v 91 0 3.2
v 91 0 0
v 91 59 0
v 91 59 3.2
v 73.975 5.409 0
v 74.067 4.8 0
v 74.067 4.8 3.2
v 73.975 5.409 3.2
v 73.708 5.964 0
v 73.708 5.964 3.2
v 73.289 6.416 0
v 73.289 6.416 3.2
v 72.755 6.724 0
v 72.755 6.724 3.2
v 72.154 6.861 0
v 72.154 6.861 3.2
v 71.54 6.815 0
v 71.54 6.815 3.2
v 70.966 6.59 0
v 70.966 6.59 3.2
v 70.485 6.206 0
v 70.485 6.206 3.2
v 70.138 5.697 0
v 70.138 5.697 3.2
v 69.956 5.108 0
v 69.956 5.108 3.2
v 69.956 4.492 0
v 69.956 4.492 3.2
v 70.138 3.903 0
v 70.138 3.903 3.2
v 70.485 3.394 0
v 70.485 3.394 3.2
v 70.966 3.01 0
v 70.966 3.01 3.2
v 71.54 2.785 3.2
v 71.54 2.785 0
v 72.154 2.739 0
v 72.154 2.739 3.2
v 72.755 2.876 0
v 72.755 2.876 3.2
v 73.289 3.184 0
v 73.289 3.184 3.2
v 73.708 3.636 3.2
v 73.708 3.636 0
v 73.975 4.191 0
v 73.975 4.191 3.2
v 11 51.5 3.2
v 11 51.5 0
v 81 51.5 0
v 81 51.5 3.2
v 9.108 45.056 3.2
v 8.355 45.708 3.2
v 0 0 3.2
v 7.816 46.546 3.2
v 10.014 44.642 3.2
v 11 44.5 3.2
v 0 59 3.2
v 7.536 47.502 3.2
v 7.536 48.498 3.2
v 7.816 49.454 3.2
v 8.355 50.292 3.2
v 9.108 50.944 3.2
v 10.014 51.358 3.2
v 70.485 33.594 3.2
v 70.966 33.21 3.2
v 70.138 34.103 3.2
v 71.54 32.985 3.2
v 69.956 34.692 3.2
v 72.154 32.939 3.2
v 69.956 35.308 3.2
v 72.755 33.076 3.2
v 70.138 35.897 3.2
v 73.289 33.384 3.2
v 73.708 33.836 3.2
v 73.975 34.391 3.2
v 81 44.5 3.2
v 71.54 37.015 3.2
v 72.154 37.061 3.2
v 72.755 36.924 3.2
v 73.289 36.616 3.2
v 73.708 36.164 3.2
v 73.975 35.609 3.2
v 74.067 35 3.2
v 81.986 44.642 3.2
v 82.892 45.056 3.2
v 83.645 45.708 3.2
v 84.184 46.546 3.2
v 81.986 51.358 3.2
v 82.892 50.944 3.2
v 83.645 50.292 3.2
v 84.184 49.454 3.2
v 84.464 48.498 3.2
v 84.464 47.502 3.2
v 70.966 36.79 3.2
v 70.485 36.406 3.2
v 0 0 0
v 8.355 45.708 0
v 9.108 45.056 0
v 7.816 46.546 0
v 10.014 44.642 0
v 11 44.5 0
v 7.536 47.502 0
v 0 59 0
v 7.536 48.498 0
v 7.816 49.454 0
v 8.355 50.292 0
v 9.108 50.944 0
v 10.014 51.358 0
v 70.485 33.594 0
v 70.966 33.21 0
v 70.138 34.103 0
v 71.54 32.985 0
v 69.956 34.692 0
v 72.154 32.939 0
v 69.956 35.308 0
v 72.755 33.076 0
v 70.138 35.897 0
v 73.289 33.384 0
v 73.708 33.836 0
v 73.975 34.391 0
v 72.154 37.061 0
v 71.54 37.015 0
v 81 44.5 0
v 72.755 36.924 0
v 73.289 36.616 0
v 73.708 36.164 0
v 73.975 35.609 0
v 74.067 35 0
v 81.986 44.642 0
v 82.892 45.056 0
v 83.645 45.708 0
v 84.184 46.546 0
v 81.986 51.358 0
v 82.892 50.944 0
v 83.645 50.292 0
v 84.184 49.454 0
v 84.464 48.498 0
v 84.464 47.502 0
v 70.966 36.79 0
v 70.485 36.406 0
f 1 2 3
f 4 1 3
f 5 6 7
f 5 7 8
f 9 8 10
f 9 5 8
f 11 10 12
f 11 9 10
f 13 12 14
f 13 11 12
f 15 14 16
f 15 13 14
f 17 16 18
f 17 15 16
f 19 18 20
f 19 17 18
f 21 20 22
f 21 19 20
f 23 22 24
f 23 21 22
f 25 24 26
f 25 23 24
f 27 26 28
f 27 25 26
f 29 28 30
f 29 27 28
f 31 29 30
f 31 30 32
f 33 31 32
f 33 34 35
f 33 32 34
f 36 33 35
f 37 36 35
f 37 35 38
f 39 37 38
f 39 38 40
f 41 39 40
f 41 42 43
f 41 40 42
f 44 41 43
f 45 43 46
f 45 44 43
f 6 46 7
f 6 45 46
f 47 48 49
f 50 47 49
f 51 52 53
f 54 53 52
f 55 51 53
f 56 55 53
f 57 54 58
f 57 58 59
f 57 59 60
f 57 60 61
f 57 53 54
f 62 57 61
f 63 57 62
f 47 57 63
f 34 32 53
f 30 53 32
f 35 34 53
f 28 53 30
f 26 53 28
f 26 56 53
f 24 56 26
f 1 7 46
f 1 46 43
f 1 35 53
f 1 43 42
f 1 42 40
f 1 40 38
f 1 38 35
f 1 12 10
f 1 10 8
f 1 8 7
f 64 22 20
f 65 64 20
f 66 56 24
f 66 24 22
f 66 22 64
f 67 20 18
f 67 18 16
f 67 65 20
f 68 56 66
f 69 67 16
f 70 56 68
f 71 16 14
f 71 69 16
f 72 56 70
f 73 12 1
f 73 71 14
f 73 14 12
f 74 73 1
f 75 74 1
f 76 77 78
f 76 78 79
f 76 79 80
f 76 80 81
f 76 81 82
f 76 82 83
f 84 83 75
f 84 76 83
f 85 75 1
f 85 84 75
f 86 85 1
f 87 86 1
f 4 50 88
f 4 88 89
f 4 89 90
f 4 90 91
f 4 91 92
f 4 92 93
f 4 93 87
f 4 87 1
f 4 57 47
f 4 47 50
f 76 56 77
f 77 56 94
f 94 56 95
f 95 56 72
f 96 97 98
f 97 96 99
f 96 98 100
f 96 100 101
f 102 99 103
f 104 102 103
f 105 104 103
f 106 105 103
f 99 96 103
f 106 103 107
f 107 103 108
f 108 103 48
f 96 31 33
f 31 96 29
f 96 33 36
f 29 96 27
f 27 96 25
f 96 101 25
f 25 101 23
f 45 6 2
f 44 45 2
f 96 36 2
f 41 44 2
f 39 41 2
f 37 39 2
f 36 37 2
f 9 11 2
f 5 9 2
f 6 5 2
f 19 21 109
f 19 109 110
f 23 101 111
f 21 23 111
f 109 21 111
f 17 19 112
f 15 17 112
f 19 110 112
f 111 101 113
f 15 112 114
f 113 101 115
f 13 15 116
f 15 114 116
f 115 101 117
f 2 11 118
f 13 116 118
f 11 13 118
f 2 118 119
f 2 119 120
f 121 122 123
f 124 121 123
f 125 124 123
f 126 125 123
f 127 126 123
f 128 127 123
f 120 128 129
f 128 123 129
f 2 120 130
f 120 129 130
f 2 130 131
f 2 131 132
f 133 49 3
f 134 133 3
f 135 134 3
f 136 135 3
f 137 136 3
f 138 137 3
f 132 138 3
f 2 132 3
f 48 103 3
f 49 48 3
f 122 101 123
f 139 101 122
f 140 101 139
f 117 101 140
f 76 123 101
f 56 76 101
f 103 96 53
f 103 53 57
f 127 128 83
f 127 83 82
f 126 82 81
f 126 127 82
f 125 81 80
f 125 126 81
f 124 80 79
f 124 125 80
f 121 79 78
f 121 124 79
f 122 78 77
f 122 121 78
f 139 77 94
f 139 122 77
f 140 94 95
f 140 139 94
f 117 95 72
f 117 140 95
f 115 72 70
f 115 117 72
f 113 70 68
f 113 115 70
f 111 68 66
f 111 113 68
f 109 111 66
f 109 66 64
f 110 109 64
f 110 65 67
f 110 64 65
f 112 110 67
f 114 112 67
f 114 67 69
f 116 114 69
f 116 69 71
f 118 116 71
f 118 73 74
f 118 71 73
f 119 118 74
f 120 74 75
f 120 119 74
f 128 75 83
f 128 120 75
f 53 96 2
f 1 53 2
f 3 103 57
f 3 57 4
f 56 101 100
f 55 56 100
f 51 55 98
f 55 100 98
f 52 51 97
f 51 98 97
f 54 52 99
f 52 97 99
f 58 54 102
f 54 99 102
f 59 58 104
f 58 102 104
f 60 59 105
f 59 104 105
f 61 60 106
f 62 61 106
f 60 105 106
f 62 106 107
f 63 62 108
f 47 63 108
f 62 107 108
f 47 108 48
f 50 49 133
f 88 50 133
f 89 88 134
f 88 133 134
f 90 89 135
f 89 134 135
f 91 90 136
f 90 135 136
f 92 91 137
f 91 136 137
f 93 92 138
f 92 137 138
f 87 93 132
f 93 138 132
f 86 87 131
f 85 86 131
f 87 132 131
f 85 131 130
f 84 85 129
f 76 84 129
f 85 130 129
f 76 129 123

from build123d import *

# Parameters (mm, degrees)
SKETCH_1_W               = 91
SKETCH_1_H               = 59
EXTRUDE_1_DEPTH          = 3.2
CUT_EXTRUDE_1_DEPTH      = 109.499953917
CUT_EXTRUDE_1_DEPTH_BACK = 109.499953917
CUT_EXTRUDE_2_DEPTH      = 109.499953917
CUT_EXTRUDE_2_DEPTH_BACK = 109.499953917
SKETCH_3_R               = 2.067


with BuildPart() as part:
    # ｽｹｯﾁ1 → ﾎﾞｽ - 押し出し1 (new body)
    with BuildSketch(Plane.XY):
        with Locations((45.5, 29.5)):
            Rectangle(SKETCH_1_W, SKETCH_1_H)
    extrude(amount=EXTRUDE_1_DEPTH)

    # ｽｹｯﾁ2 → ｶｯﾄ - 押し出し1 (cut, two sides: drawn at the far end of the back side and taken through both)
    with BuildSketch(Plane.XY.offset(-CUT_EXTRUDE_1_DEPTH_BACK)):
        with BuildLine():
            Line((11, 51.5), (81, 51.5))
            ThreePointArc((81, 51.5), (84.5, 48), (81, 44.5))
            Line((81, 44.5), (11, 44.5))
            ThreePointArc((11, 44.5), (7.5, 48), (11, 51.5))
        make_face()
    extrude(amount=CUT_EXTRUDE_1_DEPTH + CUT_EXTRUDE_1_DEPTH_BACK, mode=Mode.SUBTRACT)

    # ｽｹｯﾁ3 → ｶｯﾄ - 押し出し2 (cut, two sides: drawn at the far end of the back side and taken through both)
    with BuildSketch(Plane.XY.offset(-CUT_EXTRUDE_2_DEPTH_BACK)):
        with Locations((72, 35)):
            Circle(SKETCH_3_R)
        with Locations((72, 4.8)):
            Circle(SKETCH_3_R)
    extrude(amount=CUT_EXTRUDE_2_DEPTH + CUT_EXTRUDE_2_DEPTH_BACK, mode=Mode.SUBTRACT)


solid = part.part
